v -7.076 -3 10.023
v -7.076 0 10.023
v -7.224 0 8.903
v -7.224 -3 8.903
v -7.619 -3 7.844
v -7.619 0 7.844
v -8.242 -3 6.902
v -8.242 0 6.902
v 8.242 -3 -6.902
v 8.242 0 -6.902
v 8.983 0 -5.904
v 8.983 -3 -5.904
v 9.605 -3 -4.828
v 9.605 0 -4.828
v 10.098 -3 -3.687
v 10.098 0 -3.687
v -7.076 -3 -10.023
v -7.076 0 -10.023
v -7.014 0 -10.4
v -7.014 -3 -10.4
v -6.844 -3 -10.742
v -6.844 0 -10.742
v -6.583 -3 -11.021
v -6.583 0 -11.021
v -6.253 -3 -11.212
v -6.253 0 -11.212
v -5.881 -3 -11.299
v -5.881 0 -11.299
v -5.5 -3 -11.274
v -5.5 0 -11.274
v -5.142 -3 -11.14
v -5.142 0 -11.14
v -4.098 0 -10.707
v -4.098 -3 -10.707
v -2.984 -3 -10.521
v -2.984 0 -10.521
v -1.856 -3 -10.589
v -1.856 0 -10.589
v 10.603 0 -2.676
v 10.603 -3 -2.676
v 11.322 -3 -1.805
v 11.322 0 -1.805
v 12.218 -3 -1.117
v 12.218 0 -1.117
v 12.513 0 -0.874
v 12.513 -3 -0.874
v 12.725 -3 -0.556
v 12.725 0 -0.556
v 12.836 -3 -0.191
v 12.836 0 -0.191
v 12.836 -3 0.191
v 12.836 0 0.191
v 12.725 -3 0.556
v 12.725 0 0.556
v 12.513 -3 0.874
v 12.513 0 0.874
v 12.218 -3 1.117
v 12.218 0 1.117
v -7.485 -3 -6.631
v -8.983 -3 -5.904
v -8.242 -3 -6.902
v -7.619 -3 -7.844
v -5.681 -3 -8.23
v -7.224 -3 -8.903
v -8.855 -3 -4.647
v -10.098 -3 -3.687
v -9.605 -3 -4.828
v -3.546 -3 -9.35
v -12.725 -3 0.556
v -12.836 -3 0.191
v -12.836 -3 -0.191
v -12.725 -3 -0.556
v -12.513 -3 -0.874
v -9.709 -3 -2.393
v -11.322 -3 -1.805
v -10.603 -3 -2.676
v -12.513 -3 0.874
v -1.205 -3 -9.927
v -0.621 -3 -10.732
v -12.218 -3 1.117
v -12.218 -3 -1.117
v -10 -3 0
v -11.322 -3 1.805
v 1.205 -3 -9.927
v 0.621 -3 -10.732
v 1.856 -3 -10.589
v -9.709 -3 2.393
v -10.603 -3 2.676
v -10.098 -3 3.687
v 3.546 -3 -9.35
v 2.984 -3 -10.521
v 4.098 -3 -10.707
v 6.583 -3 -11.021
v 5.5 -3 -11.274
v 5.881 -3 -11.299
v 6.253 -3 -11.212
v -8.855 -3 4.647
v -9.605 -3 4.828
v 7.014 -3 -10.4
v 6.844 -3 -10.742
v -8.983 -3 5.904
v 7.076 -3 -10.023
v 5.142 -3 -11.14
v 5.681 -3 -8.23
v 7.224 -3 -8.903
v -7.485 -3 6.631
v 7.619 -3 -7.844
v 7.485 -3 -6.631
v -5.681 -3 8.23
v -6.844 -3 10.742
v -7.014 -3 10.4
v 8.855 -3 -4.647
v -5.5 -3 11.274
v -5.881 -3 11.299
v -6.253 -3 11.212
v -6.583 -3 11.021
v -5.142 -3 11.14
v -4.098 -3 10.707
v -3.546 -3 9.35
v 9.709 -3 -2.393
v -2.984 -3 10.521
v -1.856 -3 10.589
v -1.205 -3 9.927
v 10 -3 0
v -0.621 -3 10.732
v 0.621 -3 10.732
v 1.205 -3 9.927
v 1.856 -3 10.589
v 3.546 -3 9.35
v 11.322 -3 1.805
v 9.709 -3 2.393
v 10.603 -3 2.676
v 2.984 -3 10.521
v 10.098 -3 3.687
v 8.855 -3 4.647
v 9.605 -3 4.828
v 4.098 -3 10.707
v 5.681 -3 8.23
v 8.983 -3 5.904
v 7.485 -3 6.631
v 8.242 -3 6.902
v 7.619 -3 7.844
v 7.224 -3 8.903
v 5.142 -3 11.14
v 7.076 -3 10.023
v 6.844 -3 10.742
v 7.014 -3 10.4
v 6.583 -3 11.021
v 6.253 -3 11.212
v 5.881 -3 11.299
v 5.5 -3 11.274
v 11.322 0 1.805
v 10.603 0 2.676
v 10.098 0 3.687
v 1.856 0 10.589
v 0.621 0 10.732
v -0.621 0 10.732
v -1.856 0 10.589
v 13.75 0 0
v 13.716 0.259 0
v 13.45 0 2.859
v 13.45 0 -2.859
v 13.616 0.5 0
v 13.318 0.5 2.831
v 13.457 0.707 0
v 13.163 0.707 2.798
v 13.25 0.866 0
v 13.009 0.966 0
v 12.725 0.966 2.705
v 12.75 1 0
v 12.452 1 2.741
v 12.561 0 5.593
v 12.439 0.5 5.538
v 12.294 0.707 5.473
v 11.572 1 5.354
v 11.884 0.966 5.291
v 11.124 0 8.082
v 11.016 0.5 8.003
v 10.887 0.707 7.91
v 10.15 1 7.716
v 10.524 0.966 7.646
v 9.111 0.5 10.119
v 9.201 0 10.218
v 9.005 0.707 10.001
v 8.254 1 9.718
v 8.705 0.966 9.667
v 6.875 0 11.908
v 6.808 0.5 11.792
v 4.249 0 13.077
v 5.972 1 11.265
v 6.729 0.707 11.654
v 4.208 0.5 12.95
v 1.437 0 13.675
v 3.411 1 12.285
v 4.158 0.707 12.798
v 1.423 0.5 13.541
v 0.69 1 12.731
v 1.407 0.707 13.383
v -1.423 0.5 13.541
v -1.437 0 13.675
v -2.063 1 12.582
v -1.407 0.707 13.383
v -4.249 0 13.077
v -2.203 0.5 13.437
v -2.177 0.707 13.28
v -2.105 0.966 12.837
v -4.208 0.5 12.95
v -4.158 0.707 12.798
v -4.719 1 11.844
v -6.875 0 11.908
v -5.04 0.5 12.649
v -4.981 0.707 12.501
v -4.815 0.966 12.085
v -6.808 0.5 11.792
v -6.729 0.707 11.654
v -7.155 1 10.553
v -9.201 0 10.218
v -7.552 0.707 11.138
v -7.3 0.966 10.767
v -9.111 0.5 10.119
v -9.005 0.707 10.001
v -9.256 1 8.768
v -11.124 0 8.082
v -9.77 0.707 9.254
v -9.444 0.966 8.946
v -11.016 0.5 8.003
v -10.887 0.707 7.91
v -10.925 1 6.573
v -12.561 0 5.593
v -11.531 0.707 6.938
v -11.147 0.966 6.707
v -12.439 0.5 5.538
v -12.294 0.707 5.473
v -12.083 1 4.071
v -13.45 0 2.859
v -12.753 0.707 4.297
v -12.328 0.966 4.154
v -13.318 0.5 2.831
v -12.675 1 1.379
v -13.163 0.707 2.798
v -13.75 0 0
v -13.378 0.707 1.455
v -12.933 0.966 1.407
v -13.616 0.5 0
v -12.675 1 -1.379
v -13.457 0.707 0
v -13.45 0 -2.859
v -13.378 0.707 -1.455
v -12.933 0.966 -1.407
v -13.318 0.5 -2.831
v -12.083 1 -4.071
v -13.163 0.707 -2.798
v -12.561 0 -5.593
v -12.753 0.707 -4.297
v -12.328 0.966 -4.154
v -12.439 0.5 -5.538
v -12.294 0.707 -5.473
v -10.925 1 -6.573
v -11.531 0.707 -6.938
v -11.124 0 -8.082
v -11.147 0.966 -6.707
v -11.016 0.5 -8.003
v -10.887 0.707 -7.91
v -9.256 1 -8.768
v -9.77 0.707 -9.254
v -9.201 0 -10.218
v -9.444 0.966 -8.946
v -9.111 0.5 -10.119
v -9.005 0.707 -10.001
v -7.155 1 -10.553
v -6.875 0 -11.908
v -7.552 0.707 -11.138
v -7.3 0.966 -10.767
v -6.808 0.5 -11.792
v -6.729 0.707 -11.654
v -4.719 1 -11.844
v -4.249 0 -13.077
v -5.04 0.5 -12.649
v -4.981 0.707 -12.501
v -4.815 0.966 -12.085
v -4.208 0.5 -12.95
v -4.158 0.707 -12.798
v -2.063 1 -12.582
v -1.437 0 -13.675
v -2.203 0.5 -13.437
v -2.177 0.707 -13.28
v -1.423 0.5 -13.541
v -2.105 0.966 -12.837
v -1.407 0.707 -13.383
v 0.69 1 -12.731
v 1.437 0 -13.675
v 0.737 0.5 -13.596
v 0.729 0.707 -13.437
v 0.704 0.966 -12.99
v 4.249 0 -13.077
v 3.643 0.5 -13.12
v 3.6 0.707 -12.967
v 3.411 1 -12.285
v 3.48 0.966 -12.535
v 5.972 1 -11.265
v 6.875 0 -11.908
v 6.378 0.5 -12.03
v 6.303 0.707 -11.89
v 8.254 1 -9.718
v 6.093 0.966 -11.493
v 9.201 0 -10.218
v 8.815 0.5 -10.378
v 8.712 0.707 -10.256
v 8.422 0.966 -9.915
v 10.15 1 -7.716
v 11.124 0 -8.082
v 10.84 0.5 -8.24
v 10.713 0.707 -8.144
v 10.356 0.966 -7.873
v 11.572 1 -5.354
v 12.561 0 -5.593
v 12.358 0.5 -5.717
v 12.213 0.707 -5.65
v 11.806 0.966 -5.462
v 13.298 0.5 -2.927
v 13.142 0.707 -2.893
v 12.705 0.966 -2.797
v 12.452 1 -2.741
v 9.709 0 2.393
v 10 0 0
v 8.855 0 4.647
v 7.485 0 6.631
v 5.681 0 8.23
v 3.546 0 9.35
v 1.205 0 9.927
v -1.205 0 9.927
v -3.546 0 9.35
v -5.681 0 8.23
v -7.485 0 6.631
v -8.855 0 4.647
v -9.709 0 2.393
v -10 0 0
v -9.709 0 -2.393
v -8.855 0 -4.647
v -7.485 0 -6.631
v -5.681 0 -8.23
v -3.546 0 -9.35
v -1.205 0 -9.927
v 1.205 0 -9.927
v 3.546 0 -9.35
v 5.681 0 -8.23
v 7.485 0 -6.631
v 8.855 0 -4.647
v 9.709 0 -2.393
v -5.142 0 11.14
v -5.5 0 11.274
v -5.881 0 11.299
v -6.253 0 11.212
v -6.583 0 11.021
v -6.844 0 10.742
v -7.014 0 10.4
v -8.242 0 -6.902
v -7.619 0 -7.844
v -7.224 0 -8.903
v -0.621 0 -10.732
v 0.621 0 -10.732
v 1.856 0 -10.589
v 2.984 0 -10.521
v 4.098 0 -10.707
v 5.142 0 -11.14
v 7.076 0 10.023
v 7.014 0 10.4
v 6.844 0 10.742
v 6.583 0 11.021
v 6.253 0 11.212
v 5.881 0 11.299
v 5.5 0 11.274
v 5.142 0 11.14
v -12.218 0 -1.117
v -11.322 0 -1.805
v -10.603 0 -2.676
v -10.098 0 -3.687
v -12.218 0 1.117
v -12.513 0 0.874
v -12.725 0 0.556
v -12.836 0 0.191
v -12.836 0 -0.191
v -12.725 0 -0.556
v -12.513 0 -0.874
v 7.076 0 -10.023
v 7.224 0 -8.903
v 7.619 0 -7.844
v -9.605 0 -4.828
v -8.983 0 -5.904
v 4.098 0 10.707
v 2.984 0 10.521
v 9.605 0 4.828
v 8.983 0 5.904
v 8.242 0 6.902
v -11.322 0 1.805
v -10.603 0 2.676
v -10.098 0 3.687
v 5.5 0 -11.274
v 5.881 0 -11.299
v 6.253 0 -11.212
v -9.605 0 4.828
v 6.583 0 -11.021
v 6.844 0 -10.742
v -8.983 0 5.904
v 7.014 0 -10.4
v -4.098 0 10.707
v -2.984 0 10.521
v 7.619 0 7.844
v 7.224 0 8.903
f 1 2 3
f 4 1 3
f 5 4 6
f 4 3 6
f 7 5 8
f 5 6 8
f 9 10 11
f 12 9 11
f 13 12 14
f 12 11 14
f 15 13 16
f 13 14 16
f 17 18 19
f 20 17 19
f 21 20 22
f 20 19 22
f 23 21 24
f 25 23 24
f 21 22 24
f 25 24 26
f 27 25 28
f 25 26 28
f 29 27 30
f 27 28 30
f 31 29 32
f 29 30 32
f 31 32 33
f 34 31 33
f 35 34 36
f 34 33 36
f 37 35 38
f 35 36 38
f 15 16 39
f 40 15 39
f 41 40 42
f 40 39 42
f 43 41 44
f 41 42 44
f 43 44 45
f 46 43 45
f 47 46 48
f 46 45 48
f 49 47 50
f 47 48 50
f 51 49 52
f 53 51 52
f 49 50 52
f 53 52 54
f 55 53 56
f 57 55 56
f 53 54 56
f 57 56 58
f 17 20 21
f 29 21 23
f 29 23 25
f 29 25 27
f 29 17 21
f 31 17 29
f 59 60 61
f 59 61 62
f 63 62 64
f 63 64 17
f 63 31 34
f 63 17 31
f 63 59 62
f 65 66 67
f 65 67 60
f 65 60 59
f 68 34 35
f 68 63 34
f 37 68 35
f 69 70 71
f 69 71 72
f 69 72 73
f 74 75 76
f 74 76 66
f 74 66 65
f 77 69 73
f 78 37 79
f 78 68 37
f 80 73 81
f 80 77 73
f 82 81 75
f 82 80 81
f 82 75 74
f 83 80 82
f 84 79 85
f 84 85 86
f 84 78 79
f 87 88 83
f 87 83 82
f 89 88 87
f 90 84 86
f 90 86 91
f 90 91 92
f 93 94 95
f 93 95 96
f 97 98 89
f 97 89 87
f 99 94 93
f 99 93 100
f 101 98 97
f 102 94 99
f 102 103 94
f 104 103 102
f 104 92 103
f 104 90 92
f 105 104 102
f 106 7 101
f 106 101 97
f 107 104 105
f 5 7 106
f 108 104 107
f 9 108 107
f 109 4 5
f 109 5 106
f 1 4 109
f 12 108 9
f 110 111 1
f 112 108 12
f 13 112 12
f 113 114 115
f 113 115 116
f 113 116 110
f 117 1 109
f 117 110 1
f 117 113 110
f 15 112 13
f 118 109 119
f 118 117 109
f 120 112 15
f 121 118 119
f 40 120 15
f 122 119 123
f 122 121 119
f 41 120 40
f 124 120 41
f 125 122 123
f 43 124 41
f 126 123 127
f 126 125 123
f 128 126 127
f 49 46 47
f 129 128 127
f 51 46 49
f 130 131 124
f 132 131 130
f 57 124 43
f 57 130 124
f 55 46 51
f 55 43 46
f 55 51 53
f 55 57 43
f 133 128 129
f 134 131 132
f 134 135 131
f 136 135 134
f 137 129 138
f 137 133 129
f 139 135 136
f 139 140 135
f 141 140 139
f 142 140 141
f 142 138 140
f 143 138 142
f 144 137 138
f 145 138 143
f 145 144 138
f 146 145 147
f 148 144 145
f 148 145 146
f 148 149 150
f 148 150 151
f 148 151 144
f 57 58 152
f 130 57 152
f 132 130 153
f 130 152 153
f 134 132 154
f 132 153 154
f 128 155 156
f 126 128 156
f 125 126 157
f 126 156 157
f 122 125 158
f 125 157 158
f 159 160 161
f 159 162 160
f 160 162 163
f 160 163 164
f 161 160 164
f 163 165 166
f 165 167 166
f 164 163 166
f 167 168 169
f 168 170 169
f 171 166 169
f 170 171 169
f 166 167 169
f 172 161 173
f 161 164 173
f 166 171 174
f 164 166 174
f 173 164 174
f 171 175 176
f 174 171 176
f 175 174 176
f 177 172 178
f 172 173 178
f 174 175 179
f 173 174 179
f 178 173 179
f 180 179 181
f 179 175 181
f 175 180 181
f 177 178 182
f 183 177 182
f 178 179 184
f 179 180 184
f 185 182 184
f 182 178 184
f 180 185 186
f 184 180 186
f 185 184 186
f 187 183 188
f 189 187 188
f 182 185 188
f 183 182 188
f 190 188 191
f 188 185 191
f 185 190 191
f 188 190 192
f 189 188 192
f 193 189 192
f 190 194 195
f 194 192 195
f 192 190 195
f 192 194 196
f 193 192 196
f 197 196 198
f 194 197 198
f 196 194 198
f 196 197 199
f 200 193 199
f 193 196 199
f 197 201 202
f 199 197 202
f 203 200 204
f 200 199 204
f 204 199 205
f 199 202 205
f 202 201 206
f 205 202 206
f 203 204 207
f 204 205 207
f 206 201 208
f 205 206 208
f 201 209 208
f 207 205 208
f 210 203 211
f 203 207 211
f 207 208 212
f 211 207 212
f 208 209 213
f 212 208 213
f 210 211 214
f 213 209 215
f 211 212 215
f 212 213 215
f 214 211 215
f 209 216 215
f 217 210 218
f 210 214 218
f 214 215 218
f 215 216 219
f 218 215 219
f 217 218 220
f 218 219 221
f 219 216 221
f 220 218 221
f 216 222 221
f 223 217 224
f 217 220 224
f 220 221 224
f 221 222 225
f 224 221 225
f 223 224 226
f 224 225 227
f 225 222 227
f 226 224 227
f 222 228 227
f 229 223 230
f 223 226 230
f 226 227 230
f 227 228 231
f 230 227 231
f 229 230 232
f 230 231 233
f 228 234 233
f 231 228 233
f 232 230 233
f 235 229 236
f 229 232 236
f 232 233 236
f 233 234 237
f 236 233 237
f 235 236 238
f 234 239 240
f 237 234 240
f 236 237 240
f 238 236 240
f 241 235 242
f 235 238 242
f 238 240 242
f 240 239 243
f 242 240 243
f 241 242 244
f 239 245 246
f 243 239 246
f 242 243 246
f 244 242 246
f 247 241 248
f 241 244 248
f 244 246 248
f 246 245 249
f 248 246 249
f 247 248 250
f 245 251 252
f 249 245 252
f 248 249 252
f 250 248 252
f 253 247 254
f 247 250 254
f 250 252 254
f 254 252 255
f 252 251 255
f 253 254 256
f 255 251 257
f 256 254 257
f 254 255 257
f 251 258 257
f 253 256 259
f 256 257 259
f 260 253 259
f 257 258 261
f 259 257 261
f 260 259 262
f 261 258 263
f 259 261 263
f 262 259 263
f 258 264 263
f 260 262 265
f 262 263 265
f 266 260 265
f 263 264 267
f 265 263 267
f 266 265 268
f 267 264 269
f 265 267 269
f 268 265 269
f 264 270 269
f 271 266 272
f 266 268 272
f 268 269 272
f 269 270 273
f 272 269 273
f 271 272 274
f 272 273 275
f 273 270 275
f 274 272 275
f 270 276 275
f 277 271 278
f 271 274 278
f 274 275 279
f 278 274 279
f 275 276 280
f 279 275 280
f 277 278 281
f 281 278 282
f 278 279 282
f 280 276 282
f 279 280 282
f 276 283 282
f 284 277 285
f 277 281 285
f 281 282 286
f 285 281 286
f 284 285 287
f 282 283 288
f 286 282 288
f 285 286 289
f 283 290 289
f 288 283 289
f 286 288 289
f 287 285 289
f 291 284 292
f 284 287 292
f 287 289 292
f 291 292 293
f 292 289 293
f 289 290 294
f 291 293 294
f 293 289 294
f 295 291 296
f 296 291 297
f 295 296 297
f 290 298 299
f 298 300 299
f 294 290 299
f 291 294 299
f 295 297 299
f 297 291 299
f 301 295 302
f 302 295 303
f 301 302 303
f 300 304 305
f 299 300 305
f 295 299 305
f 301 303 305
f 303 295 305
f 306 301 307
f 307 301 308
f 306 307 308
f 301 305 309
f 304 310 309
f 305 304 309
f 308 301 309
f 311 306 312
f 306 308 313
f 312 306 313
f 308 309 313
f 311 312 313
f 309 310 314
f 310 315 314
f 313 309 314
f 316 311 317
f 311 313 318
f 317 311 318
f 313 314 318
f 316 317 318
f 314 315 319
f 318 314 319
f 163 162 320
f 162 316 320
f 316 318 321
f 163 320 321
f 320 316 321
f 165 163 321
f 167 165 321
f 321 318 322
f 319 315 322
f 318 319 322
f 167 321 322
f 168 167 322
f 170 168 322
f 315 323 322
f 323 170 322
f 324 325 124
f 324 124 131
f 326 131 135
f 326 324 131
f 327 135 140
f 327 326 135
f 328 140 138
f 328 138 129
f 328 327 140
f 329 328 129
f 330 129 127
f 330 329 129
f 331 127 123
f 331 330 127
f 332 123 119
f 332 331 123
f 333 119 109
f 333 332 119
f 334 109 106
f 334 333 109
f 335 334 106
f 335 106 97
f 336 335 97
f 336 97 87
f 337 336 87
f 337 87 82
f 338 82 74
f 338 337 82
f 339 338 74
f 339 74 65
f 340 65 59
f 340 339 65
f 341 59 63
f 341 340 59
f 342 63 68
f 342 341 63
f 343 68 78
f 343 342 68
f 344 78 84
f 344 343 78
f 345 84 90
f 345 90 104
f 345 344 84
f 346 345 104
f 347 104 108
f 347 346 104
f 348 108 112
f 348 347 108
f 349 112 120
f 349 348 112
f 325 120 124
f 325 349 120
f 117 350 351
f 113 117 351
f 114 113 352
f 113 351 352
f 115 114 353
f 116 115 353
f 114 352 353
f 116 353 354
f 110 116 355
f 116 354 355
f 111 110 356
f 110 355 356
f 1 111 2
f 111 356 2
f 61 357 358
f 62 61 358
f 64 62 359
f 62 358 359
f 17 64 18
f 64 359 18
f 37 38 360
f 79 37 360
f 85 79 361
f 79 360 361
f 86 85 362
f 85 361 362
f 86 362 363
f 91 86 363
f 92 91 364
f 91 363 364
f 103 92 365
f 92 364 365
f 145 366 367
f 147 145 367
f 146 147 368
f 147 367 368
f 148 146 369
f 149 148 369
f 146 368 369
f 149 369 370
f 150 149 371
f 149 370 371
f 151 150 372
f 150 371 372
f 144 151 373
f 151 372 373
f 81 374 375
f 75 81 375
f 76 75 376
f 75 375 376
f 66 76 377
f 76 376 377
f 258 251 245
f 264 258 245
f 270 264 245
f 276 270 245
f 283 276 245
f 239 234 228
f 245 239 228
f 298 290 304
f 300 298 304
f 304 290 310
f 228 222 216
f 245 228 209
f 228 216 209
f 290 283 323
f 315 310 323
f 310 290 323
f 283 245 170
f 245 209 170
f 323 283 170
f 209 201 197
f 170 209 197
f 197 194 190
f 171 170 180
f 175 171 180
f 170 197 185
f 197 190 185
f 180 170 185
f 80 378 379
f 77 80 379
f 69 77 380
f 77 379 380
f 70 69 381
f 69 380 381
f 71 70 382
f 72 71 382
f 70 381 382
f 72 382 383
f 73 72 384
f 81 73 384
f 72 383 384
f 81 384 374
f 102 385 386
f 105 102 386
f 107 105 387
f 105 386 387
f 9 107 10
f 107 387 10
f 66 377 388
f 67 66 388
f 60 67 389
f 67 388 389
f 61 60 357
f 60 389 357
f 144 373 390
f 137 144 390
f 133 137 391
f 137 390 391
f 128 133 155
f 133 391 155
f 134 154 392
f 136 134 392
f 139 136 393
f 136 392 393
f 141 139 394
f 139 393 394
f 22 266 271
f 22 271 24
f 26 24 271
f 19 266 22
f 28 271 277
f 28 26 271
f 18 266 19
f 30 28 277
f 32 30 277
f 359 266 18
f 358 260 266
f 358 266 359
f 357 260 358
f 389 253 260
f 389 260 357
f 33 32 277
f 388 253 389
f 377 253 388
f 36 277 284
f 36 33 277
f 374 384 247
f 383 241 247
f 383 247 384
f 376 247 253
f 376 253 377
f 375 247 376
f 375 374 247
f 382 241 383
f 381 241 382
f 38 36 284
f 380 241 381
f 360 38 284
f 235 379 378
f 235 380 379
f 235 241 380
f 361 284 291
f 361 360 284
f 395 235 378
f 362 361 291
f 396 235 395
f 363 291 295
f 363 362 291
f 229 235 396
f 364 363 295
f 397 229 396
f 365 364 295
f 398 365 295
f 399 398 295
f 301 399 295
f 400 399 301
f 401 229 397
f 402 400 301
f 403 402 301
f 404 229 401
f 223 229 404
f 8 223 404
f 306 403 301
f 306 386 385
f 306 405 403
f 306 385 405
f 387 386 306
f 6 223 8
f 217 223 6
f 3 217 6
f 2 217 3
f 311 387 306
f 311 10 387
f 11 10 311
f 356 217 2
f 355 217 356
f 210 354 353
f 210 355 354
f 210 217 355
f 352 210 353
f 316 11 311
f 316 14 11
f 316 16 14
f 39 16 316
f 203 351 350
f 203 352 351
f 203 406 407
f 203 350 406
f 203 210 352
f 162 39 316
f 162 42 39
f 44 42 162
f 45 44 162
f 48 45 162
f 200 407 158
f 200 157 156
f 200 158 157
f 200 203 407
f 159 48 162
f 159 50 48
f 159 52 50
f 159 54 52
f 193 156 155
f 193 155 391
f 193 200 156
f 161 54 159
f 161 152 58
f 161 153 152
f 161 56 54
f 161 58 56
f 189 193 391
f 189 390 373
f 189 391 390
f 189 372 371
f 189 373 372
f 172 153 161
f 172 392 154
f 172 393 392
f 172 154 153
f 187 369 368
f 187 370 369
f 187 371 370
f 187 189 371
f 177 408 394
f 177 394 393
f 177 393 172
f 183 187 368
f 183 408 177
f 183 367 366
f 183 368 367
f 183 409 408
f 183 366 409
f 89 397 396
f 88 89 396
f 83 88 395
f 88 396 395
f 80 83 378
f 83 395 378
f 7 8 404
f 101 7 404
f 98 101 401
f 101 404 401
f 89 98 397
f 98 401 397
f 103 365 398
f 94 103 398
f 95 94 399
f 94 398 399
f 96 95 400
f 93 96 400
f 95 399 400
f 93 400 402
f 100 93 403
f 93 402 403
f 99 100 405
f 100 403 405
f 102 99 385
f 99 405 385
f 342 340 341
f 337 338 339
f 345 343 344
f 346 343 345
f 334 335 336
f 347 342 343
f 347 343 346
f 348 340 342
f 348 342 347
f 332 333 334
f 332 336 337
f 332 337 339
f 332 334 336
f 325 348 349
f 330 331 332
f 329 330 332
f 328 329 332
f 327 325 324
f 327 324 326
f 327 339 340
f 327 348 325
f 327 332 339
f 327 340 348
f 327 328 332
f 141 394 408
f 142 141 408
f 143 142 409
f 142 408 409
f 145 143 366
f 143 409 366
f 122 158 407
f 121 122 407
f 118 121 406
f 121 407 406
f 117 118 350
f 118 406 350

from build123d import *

# Parameters (mm, degrees)
F0_R     = 10
F1_DEPTH = 3
F2_R     = 13.75
F3_DEPTH = 1
F4_R     = 0.99999


# Not quite as in the source:
# - a fillet or chamfer is up to 0.001 mm smaller than in the source, because OpenCascade refuses the exact size


with BuildPart() as f1:
    # F0 (on Front) → F1 (new body)
    with BuildSketch(Plane.XZ):
        with BuildLine():
            ThreePointArc((-7.0762930266, 10.0230719262), (-7.391479251, 8.3623594503), (-8.2420141709, 6.901572459))
            ThreePointArc((-8.2420141709, 6.901572459), (-9.3097730907, 5.375), (-10.097944161, 3.6870074208))
            ThreePointArc((-10.097944161, 3.6870074208), (-10.937755345, 2.2200290777), (-12.2183814254, 1.1167135625))
            ThreePointArc((-12.2183814254, 1.1167135625), (-12.85, 0), (-12.2183814254, -1.1167135625))
            ThreePointArc((-12.2183814254, -1.1167135625), (-10.937755345, -2.2200290777), (-10.097944161, -3.6870074208))
            ThreePointArc((-10.097944161, -3.6870074208), (-9.3097730907, -5.375), (-8.2420141709, -6.901572459))
            ThreePointArc((-8.2420141709, -6.901572459), (-7.391479251, -8.3623594503), (-7.0762930266, -10.0230719262))
            ThreePointArc((-7.0762930266, -10.0230719262), (-6.425, -11.1284264386), (-5.1420883988, -11.1397854887))
            ThreePointArc((-5.1420883988, -11.1397854887), (-3.5462760941, -10.582388528), (-1.8559299902, -10.5885798798))
            ThreePointArc((-1.8559299902, -10.5885798798), (0, -10.75), (1.8559299902, -10.5885798798))
            ThreePointArc((1.8559299902, -10.5885798798), (3.5462760941, -10.582388528), (5.1420883988, -11.1397854887))
            ThreePointArc((5.1420883988, -11.1397854887), (6.425, -11.1284264386), (7.0762930266, -10.0230719262))
            ThreePointArc((7.0762930266, -10.0230719262), (7.391479251, -8.3623594503), (8.2420141709, -6.901572459))
            ThreePointArc((8.2420141709, -6.901572459), (9.3097730907, -5.375), (10.097944161, -3.6870074208))
            ThreePointArc((10.097944161, -3.6870074208), (10.937755345, -2.2200290777), (12.2183814254, -1.1167135625))
            ThreePointArc((12.2183814254, -1.1167135625), (12.85, 0), (12.2183814254, 1.1167135625))
            ThreePointArc((12.2183814254, 1.1167135625), (10.937755345, 2.2200290777), (10.097944161, 3.6870074208))
            ThreePointArc((10.097944161, 3.6870074208), (9.3097730907, 5.375), (8.2420141709, 6.901572459))
            ThreePointArc((8.2420141709, 6.901572459), (7.391479251, 8.3623594503), (7.0762930266, 10.0230719262))
            ThreePointArc((7.0762930266, 10.0230719262), (6.425, 11.1284264386), (5.1420883988, 11.1397854887))
            ThreePointArc((5.1420883988, 11.1397854887), (3.5462760941, 10.582388528), (1.8559299902, 10.5885798798))
            ThreePointArc((1.8559299902, 10.5885798798), (0, 10.75), (-1.8559299902, 10.5885798798))
            ThreePointArc((-1.8559299902, 10.5885798798), (-3.5462760941, 10.582388528), (-5.1420883988, 11.1397854887))
            ThreePointArc((-5.1420883988, 11.1397854887), (-6.425, 11.1284264386), (-7.0762930266, 10.0230719262))
        make_face()
        Circle(F0_R, mode=Mode.SUBTRACT)
    extrude(amount=F1_DEPTH)

    # F2 (on Front) → F3 (join)
    with BuildSketch(Plane.XZ):
        Circle(F2_R)
    extrude(amount=-F3_DEPTH)

    # F4 (radius 1 in the source; OpenCascade refuses exactly that, so slightly less here)
    f4_edges = [f1.edges().sort_by_distance(p)[0] for p in [
        (-13.75, 1, 0),
    ]]
    fillet(f4_edges, radius=F4_R)


solid = f1.part
